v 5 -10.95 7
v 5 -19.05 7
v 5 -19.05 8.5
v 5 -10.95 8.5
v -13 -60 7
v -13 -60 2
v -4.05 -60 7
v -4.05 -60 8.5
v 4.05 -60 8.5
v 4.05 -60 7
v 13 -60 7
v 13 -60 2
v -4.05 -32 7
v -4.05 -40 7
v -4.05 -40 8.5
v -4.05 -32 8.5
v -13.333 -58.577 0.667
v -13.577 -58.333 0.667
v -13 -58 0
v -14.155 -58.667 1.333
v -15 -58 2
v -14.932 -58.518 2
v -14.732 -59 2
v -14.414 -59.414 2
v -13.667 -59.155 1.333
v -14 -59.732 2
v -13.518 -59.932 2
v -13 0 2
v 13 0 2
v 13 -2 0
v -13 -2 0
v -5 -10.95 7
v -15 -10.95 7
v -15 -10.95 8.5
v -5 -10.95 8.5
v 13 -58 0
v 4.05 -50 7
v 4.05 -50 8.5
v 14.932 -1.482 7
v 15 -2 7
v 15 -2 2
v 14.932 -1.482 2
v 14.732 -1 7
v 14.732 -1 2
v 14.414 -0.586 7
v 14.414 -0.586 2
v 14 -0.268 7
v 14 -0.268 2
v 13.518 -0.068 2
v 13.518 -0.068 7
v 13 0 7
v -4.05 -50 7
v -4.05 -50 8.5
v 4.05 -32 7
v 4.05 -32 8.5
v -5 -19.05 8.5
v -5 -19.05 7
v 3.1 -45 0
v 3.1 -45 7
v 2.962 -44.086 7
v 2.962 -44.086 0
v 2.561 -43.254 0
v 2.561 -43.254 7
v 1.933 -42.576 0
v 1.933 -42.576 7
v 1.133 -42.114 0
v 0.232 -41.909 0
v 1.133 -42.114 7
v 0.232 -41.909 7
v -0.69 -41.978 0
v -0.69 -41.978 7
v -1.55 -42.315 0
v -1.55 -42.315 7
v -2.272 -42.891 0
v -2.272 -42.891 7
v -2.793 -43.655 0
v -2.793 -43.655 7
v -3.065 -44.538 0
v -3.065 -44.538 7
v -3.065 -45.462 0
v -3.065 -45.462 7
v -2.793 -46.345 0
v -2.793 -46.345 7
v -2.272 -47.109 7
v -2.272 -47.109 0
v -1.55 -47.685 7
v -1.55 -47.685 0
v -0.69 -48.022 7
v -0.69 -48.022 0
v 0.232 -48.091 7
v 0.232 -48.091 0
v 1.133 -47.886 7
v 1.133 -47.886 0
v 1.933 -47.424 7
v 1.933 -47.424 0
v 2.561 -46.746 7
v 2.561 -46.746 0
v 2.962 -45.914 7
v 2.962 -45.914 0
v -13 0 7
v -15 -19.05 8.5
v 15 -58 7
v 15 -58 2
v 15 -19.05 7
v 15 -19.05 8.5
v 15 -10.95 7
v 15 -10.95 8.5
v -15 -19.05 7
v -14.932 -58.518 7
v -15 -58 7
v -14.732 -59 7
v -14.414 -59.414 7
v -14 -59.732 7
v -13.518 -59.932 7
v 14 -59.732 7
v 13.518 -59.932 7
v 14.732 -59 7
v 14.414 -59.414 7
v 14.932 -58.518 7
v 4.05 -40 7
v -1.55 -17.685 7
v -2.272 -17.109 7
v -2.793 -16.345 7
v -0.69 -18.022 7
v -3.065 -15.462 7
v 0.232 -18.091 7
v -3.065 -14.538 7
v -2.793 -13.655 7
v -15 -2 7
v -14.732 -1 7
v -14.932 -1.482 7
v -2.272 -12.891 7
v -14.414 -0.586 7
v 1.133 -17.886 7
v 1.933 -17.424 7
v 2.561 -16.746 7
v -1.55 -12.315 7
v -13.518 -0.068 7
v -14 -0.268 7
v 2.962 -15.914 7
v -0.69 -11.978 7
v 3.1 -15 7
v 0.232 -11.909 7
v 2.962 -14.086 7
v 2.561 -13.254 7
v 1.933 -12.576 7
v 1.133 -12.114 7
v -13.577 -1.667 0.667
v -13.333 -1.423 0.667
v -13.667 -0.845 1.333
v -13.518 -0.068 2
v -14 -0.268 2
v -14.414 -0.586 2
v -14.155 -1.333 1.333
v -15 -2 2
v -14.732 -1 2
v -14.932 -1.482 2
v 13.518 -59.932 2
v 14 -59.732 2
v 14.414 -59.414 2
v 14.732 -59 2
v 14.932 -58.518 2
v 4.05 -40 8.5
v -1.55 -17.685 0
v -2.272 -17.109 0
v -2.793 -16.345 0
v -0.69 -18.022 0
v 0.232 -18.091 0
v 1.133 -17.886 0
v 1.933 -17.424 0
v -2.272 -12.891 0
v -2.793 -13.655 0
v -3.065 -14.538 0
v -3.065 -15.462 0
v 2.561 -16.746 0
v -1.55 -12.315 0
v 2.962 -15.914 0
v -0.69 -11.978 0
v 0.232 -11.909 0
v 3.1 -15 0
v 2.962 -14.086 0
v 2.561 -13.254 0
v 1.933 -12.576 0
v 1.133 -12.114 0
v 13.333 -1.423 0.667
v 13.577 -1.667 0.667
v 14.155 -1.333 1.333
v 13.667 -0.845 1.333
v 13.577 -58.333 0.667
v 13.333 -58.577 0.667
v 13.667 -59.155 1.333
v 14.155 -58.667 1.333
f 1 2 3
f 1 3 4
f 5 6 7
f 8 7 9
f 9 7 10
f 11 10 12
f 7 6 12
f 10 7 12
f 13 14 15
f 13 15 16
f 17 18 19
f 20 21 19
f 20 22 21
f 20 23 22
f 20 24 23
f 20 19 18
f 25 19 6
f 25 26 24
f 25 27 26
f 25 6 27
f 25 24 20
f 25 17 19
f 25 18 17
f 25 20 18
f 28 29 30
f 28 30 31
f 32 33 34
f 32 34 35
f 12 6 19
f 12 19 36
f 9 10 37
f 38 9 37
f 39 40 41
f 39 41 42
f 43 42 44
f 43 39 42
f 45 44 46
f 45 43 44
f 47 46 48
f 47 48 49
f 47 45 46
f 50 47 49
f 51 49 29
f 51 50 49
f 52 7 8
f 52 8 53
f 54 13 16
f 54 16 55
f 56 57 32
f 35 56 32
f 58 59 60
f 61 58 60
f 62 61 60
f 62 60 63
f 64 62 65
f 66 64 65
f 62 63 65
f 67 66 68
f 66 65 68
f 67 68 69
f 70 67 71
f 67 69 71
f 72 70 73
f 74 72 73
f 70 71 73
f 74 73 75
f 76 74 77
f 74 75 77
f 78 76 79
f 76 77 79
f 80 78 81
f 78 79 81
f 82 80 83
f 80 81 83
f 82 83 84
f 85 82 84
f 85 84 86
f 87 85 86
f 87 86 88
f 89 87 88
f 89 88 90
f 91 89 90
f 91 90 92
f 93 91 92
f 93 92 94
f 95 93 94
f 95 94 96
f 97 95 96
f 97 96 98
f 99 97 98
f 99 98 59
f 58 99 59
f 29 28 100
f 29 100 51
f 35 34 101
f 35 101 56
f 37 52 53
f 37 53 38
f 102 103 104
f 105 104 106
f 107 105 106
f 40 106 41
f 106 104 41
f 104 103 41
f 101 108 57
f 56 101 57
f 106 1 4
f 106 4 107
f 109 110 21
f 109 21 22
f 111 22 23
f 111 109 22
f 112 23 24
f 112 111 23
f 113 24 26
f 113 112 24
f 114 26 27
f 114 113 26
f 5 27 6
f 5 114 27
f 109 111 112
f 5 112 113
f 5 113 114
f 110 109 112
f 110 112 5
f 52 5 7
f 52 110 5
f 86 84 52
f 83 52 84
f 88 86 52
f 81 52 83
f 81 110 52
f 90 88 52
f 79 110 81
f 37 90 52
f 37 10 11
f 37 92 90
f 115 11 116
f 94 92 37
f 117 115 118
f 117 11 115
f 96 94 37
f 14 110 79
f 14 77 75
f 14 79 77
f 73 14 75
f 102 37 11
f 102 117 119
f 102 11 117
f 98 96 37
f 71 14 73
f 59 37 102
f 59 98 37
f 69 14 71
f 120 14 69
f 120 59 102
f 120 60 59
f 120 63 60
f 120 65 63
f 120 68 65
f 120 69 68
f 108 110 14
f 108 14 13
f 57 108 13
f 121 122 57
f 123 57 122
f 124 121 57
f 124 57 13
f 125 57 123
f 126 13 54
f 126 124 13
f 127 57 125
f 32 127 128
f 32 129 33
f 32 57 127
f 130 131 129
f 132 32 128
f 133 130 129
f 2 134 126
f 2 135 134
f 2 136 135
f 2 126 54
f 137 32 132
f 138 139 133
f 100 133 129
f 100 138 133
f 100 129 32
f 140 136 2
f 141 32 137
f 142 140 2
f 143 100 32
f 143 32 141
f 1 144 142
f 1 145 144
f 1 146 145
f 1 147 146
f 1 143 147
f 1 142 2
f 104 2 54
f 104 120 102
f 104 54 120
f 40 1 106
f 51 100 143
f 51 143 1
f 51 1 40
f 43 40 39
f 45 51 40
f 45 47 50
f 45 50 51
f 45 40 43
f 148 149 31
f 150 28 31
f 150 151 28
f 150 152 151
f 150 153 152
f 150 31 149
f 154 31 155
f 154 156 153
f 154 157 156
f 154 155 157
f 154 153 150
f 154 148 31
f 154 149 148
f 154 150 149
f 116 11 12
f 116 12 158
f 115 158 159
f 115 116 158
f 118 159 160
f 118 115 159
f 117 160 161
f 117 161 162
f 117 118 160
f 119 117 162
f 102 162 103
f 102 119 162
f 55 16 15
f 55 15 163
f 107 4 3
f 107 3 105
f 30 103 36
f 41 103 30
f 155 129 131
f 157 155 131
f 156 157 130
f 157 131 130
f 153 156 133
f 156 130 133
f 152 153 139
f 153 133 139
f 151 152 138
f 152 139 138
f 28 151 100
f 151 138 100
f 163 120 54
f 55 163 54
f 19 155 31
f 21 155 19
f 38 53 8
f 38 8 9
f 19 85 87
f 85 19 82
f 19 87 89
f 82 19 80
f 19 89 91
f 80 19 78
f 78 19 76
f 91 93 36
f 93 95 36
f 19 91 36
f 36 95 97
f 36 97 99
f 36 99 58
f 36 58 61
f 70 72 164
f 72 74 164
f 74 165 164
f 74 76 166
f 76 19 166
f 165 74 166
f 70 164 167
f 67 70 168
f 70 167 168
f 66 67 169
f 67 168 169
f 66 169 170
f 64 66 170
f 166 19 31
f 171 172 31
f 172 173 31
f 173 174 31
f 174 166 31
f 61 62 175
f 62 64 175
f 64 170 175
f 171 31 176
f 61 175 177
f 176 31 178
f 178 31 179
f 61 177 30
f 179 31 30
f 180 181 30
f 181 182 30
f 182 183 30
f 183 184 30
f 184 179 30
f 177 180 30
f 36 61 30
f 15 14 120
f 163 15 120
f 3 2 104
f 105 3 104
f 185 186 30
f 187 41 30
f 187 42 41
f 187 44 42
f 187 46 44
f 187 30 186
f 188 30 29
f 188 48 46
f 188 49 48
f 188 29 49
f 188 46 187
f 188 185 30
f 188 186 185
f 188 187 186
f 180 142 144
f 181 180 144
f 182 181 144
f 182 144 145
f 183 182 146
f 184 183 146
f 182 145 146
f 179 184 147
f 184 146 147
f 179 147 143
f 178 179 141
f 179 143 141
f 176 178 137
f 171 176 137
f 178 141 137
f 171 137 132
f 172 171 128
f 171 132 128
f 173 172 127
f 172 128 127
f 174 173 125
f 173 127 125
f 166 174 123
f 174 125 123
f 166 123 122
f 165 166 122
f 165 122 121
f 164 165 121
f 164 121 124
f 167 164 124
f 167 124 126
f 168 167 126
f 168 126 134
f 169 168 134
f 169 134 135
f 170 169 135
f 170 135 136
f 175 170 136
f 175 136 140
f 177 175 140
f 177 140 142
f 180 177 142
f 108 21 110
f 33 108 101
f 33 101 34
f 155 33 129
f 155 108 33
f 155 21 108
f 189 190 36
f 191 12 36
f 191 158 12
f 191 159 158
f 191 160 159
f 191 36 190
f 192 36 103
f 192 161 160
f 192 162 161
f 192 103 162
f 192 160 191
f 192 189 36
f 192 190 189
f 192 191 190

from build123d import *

# Parameters (mm, degrees)
SKETCH_W      = 30
SKETCH_H      = 60
PAD_DEPTH     = 7
FILLET_R      = 2
CHAMFER_SIZE  = 2
SKETCH001_R   = 3.1
POCKET_DEPTH  = 7.001
SKETCH002_W   = 10
SKETCH002_H   = 8.1
SKETCH002_W_2 = 8.1
SKETCH002_H_2 = 10
SKETCH002_H_3 = 8
PAD001_DEPTH  = 1.5


with BuildPart() as part:
    # Sketch → Pad (new body)
    with BuildSketch(Plane.XY):
        with Locations((0, -30)):
            Rectangle(SKETCH_W, SKETCH_H)
    extrude(amount=PAD_DEPTH)

    # Fillet
    fillet_edges = [part.edges().sort_by_distance(p)[0] for p in [
        (15, -60, 3.5),
        (15, 0, 3.5),
        (-15, 0, 3.5),
        (-15, -60, 3.5),
    ]]
    fillet(fillet_edges, radius=FILLET_R)

    # Chamfer
    chamfer_edges = [part.edges().sort_by_distance(p)[0] for p in [
        (15, -30, 0),
        (0, -60, 0),
        (-15, -30, 0),
        (0, 0, 0),
    ]]
    chamfer(chamfer_edges, length=CHAMFER_SIZE)

    # Sketch001 (on Face4 of Chamfer) → Pocket (cut, through all)
    with BuildSketch(Plane.XY.offset(7)):
        with Locations((0, -15)):
            Circle(SKETCH001_R)
        with Locations((0, -45)):
            Circle(SKETCH001_R)
    extrude(amount=-POCKET_DEPTH, mode=Mode.SUBTRACT)

    # Sketch002 (on Face4 of Pocket) → Pad001 (join)
    with BuildSketch(Plane.XY.offset(7)):
        with Locations((-10, -15)):
            Rectangle(SKETCH002_W, SKETCH002_H)
        with Locations((10, -15)):
            Rectangle(SKETCH002_W, SKETCH002_H)
        with Locations((0, -55)):
            Rectangle(SKETCH002_W_2, SKETCH002_H_2)
        with Locations((0, -36)):
            Rectangle(SKETCH002_W_2, SKETCH002_H_3)
    extrude(amount=PAD001_DEPTH)


solid = part.part
